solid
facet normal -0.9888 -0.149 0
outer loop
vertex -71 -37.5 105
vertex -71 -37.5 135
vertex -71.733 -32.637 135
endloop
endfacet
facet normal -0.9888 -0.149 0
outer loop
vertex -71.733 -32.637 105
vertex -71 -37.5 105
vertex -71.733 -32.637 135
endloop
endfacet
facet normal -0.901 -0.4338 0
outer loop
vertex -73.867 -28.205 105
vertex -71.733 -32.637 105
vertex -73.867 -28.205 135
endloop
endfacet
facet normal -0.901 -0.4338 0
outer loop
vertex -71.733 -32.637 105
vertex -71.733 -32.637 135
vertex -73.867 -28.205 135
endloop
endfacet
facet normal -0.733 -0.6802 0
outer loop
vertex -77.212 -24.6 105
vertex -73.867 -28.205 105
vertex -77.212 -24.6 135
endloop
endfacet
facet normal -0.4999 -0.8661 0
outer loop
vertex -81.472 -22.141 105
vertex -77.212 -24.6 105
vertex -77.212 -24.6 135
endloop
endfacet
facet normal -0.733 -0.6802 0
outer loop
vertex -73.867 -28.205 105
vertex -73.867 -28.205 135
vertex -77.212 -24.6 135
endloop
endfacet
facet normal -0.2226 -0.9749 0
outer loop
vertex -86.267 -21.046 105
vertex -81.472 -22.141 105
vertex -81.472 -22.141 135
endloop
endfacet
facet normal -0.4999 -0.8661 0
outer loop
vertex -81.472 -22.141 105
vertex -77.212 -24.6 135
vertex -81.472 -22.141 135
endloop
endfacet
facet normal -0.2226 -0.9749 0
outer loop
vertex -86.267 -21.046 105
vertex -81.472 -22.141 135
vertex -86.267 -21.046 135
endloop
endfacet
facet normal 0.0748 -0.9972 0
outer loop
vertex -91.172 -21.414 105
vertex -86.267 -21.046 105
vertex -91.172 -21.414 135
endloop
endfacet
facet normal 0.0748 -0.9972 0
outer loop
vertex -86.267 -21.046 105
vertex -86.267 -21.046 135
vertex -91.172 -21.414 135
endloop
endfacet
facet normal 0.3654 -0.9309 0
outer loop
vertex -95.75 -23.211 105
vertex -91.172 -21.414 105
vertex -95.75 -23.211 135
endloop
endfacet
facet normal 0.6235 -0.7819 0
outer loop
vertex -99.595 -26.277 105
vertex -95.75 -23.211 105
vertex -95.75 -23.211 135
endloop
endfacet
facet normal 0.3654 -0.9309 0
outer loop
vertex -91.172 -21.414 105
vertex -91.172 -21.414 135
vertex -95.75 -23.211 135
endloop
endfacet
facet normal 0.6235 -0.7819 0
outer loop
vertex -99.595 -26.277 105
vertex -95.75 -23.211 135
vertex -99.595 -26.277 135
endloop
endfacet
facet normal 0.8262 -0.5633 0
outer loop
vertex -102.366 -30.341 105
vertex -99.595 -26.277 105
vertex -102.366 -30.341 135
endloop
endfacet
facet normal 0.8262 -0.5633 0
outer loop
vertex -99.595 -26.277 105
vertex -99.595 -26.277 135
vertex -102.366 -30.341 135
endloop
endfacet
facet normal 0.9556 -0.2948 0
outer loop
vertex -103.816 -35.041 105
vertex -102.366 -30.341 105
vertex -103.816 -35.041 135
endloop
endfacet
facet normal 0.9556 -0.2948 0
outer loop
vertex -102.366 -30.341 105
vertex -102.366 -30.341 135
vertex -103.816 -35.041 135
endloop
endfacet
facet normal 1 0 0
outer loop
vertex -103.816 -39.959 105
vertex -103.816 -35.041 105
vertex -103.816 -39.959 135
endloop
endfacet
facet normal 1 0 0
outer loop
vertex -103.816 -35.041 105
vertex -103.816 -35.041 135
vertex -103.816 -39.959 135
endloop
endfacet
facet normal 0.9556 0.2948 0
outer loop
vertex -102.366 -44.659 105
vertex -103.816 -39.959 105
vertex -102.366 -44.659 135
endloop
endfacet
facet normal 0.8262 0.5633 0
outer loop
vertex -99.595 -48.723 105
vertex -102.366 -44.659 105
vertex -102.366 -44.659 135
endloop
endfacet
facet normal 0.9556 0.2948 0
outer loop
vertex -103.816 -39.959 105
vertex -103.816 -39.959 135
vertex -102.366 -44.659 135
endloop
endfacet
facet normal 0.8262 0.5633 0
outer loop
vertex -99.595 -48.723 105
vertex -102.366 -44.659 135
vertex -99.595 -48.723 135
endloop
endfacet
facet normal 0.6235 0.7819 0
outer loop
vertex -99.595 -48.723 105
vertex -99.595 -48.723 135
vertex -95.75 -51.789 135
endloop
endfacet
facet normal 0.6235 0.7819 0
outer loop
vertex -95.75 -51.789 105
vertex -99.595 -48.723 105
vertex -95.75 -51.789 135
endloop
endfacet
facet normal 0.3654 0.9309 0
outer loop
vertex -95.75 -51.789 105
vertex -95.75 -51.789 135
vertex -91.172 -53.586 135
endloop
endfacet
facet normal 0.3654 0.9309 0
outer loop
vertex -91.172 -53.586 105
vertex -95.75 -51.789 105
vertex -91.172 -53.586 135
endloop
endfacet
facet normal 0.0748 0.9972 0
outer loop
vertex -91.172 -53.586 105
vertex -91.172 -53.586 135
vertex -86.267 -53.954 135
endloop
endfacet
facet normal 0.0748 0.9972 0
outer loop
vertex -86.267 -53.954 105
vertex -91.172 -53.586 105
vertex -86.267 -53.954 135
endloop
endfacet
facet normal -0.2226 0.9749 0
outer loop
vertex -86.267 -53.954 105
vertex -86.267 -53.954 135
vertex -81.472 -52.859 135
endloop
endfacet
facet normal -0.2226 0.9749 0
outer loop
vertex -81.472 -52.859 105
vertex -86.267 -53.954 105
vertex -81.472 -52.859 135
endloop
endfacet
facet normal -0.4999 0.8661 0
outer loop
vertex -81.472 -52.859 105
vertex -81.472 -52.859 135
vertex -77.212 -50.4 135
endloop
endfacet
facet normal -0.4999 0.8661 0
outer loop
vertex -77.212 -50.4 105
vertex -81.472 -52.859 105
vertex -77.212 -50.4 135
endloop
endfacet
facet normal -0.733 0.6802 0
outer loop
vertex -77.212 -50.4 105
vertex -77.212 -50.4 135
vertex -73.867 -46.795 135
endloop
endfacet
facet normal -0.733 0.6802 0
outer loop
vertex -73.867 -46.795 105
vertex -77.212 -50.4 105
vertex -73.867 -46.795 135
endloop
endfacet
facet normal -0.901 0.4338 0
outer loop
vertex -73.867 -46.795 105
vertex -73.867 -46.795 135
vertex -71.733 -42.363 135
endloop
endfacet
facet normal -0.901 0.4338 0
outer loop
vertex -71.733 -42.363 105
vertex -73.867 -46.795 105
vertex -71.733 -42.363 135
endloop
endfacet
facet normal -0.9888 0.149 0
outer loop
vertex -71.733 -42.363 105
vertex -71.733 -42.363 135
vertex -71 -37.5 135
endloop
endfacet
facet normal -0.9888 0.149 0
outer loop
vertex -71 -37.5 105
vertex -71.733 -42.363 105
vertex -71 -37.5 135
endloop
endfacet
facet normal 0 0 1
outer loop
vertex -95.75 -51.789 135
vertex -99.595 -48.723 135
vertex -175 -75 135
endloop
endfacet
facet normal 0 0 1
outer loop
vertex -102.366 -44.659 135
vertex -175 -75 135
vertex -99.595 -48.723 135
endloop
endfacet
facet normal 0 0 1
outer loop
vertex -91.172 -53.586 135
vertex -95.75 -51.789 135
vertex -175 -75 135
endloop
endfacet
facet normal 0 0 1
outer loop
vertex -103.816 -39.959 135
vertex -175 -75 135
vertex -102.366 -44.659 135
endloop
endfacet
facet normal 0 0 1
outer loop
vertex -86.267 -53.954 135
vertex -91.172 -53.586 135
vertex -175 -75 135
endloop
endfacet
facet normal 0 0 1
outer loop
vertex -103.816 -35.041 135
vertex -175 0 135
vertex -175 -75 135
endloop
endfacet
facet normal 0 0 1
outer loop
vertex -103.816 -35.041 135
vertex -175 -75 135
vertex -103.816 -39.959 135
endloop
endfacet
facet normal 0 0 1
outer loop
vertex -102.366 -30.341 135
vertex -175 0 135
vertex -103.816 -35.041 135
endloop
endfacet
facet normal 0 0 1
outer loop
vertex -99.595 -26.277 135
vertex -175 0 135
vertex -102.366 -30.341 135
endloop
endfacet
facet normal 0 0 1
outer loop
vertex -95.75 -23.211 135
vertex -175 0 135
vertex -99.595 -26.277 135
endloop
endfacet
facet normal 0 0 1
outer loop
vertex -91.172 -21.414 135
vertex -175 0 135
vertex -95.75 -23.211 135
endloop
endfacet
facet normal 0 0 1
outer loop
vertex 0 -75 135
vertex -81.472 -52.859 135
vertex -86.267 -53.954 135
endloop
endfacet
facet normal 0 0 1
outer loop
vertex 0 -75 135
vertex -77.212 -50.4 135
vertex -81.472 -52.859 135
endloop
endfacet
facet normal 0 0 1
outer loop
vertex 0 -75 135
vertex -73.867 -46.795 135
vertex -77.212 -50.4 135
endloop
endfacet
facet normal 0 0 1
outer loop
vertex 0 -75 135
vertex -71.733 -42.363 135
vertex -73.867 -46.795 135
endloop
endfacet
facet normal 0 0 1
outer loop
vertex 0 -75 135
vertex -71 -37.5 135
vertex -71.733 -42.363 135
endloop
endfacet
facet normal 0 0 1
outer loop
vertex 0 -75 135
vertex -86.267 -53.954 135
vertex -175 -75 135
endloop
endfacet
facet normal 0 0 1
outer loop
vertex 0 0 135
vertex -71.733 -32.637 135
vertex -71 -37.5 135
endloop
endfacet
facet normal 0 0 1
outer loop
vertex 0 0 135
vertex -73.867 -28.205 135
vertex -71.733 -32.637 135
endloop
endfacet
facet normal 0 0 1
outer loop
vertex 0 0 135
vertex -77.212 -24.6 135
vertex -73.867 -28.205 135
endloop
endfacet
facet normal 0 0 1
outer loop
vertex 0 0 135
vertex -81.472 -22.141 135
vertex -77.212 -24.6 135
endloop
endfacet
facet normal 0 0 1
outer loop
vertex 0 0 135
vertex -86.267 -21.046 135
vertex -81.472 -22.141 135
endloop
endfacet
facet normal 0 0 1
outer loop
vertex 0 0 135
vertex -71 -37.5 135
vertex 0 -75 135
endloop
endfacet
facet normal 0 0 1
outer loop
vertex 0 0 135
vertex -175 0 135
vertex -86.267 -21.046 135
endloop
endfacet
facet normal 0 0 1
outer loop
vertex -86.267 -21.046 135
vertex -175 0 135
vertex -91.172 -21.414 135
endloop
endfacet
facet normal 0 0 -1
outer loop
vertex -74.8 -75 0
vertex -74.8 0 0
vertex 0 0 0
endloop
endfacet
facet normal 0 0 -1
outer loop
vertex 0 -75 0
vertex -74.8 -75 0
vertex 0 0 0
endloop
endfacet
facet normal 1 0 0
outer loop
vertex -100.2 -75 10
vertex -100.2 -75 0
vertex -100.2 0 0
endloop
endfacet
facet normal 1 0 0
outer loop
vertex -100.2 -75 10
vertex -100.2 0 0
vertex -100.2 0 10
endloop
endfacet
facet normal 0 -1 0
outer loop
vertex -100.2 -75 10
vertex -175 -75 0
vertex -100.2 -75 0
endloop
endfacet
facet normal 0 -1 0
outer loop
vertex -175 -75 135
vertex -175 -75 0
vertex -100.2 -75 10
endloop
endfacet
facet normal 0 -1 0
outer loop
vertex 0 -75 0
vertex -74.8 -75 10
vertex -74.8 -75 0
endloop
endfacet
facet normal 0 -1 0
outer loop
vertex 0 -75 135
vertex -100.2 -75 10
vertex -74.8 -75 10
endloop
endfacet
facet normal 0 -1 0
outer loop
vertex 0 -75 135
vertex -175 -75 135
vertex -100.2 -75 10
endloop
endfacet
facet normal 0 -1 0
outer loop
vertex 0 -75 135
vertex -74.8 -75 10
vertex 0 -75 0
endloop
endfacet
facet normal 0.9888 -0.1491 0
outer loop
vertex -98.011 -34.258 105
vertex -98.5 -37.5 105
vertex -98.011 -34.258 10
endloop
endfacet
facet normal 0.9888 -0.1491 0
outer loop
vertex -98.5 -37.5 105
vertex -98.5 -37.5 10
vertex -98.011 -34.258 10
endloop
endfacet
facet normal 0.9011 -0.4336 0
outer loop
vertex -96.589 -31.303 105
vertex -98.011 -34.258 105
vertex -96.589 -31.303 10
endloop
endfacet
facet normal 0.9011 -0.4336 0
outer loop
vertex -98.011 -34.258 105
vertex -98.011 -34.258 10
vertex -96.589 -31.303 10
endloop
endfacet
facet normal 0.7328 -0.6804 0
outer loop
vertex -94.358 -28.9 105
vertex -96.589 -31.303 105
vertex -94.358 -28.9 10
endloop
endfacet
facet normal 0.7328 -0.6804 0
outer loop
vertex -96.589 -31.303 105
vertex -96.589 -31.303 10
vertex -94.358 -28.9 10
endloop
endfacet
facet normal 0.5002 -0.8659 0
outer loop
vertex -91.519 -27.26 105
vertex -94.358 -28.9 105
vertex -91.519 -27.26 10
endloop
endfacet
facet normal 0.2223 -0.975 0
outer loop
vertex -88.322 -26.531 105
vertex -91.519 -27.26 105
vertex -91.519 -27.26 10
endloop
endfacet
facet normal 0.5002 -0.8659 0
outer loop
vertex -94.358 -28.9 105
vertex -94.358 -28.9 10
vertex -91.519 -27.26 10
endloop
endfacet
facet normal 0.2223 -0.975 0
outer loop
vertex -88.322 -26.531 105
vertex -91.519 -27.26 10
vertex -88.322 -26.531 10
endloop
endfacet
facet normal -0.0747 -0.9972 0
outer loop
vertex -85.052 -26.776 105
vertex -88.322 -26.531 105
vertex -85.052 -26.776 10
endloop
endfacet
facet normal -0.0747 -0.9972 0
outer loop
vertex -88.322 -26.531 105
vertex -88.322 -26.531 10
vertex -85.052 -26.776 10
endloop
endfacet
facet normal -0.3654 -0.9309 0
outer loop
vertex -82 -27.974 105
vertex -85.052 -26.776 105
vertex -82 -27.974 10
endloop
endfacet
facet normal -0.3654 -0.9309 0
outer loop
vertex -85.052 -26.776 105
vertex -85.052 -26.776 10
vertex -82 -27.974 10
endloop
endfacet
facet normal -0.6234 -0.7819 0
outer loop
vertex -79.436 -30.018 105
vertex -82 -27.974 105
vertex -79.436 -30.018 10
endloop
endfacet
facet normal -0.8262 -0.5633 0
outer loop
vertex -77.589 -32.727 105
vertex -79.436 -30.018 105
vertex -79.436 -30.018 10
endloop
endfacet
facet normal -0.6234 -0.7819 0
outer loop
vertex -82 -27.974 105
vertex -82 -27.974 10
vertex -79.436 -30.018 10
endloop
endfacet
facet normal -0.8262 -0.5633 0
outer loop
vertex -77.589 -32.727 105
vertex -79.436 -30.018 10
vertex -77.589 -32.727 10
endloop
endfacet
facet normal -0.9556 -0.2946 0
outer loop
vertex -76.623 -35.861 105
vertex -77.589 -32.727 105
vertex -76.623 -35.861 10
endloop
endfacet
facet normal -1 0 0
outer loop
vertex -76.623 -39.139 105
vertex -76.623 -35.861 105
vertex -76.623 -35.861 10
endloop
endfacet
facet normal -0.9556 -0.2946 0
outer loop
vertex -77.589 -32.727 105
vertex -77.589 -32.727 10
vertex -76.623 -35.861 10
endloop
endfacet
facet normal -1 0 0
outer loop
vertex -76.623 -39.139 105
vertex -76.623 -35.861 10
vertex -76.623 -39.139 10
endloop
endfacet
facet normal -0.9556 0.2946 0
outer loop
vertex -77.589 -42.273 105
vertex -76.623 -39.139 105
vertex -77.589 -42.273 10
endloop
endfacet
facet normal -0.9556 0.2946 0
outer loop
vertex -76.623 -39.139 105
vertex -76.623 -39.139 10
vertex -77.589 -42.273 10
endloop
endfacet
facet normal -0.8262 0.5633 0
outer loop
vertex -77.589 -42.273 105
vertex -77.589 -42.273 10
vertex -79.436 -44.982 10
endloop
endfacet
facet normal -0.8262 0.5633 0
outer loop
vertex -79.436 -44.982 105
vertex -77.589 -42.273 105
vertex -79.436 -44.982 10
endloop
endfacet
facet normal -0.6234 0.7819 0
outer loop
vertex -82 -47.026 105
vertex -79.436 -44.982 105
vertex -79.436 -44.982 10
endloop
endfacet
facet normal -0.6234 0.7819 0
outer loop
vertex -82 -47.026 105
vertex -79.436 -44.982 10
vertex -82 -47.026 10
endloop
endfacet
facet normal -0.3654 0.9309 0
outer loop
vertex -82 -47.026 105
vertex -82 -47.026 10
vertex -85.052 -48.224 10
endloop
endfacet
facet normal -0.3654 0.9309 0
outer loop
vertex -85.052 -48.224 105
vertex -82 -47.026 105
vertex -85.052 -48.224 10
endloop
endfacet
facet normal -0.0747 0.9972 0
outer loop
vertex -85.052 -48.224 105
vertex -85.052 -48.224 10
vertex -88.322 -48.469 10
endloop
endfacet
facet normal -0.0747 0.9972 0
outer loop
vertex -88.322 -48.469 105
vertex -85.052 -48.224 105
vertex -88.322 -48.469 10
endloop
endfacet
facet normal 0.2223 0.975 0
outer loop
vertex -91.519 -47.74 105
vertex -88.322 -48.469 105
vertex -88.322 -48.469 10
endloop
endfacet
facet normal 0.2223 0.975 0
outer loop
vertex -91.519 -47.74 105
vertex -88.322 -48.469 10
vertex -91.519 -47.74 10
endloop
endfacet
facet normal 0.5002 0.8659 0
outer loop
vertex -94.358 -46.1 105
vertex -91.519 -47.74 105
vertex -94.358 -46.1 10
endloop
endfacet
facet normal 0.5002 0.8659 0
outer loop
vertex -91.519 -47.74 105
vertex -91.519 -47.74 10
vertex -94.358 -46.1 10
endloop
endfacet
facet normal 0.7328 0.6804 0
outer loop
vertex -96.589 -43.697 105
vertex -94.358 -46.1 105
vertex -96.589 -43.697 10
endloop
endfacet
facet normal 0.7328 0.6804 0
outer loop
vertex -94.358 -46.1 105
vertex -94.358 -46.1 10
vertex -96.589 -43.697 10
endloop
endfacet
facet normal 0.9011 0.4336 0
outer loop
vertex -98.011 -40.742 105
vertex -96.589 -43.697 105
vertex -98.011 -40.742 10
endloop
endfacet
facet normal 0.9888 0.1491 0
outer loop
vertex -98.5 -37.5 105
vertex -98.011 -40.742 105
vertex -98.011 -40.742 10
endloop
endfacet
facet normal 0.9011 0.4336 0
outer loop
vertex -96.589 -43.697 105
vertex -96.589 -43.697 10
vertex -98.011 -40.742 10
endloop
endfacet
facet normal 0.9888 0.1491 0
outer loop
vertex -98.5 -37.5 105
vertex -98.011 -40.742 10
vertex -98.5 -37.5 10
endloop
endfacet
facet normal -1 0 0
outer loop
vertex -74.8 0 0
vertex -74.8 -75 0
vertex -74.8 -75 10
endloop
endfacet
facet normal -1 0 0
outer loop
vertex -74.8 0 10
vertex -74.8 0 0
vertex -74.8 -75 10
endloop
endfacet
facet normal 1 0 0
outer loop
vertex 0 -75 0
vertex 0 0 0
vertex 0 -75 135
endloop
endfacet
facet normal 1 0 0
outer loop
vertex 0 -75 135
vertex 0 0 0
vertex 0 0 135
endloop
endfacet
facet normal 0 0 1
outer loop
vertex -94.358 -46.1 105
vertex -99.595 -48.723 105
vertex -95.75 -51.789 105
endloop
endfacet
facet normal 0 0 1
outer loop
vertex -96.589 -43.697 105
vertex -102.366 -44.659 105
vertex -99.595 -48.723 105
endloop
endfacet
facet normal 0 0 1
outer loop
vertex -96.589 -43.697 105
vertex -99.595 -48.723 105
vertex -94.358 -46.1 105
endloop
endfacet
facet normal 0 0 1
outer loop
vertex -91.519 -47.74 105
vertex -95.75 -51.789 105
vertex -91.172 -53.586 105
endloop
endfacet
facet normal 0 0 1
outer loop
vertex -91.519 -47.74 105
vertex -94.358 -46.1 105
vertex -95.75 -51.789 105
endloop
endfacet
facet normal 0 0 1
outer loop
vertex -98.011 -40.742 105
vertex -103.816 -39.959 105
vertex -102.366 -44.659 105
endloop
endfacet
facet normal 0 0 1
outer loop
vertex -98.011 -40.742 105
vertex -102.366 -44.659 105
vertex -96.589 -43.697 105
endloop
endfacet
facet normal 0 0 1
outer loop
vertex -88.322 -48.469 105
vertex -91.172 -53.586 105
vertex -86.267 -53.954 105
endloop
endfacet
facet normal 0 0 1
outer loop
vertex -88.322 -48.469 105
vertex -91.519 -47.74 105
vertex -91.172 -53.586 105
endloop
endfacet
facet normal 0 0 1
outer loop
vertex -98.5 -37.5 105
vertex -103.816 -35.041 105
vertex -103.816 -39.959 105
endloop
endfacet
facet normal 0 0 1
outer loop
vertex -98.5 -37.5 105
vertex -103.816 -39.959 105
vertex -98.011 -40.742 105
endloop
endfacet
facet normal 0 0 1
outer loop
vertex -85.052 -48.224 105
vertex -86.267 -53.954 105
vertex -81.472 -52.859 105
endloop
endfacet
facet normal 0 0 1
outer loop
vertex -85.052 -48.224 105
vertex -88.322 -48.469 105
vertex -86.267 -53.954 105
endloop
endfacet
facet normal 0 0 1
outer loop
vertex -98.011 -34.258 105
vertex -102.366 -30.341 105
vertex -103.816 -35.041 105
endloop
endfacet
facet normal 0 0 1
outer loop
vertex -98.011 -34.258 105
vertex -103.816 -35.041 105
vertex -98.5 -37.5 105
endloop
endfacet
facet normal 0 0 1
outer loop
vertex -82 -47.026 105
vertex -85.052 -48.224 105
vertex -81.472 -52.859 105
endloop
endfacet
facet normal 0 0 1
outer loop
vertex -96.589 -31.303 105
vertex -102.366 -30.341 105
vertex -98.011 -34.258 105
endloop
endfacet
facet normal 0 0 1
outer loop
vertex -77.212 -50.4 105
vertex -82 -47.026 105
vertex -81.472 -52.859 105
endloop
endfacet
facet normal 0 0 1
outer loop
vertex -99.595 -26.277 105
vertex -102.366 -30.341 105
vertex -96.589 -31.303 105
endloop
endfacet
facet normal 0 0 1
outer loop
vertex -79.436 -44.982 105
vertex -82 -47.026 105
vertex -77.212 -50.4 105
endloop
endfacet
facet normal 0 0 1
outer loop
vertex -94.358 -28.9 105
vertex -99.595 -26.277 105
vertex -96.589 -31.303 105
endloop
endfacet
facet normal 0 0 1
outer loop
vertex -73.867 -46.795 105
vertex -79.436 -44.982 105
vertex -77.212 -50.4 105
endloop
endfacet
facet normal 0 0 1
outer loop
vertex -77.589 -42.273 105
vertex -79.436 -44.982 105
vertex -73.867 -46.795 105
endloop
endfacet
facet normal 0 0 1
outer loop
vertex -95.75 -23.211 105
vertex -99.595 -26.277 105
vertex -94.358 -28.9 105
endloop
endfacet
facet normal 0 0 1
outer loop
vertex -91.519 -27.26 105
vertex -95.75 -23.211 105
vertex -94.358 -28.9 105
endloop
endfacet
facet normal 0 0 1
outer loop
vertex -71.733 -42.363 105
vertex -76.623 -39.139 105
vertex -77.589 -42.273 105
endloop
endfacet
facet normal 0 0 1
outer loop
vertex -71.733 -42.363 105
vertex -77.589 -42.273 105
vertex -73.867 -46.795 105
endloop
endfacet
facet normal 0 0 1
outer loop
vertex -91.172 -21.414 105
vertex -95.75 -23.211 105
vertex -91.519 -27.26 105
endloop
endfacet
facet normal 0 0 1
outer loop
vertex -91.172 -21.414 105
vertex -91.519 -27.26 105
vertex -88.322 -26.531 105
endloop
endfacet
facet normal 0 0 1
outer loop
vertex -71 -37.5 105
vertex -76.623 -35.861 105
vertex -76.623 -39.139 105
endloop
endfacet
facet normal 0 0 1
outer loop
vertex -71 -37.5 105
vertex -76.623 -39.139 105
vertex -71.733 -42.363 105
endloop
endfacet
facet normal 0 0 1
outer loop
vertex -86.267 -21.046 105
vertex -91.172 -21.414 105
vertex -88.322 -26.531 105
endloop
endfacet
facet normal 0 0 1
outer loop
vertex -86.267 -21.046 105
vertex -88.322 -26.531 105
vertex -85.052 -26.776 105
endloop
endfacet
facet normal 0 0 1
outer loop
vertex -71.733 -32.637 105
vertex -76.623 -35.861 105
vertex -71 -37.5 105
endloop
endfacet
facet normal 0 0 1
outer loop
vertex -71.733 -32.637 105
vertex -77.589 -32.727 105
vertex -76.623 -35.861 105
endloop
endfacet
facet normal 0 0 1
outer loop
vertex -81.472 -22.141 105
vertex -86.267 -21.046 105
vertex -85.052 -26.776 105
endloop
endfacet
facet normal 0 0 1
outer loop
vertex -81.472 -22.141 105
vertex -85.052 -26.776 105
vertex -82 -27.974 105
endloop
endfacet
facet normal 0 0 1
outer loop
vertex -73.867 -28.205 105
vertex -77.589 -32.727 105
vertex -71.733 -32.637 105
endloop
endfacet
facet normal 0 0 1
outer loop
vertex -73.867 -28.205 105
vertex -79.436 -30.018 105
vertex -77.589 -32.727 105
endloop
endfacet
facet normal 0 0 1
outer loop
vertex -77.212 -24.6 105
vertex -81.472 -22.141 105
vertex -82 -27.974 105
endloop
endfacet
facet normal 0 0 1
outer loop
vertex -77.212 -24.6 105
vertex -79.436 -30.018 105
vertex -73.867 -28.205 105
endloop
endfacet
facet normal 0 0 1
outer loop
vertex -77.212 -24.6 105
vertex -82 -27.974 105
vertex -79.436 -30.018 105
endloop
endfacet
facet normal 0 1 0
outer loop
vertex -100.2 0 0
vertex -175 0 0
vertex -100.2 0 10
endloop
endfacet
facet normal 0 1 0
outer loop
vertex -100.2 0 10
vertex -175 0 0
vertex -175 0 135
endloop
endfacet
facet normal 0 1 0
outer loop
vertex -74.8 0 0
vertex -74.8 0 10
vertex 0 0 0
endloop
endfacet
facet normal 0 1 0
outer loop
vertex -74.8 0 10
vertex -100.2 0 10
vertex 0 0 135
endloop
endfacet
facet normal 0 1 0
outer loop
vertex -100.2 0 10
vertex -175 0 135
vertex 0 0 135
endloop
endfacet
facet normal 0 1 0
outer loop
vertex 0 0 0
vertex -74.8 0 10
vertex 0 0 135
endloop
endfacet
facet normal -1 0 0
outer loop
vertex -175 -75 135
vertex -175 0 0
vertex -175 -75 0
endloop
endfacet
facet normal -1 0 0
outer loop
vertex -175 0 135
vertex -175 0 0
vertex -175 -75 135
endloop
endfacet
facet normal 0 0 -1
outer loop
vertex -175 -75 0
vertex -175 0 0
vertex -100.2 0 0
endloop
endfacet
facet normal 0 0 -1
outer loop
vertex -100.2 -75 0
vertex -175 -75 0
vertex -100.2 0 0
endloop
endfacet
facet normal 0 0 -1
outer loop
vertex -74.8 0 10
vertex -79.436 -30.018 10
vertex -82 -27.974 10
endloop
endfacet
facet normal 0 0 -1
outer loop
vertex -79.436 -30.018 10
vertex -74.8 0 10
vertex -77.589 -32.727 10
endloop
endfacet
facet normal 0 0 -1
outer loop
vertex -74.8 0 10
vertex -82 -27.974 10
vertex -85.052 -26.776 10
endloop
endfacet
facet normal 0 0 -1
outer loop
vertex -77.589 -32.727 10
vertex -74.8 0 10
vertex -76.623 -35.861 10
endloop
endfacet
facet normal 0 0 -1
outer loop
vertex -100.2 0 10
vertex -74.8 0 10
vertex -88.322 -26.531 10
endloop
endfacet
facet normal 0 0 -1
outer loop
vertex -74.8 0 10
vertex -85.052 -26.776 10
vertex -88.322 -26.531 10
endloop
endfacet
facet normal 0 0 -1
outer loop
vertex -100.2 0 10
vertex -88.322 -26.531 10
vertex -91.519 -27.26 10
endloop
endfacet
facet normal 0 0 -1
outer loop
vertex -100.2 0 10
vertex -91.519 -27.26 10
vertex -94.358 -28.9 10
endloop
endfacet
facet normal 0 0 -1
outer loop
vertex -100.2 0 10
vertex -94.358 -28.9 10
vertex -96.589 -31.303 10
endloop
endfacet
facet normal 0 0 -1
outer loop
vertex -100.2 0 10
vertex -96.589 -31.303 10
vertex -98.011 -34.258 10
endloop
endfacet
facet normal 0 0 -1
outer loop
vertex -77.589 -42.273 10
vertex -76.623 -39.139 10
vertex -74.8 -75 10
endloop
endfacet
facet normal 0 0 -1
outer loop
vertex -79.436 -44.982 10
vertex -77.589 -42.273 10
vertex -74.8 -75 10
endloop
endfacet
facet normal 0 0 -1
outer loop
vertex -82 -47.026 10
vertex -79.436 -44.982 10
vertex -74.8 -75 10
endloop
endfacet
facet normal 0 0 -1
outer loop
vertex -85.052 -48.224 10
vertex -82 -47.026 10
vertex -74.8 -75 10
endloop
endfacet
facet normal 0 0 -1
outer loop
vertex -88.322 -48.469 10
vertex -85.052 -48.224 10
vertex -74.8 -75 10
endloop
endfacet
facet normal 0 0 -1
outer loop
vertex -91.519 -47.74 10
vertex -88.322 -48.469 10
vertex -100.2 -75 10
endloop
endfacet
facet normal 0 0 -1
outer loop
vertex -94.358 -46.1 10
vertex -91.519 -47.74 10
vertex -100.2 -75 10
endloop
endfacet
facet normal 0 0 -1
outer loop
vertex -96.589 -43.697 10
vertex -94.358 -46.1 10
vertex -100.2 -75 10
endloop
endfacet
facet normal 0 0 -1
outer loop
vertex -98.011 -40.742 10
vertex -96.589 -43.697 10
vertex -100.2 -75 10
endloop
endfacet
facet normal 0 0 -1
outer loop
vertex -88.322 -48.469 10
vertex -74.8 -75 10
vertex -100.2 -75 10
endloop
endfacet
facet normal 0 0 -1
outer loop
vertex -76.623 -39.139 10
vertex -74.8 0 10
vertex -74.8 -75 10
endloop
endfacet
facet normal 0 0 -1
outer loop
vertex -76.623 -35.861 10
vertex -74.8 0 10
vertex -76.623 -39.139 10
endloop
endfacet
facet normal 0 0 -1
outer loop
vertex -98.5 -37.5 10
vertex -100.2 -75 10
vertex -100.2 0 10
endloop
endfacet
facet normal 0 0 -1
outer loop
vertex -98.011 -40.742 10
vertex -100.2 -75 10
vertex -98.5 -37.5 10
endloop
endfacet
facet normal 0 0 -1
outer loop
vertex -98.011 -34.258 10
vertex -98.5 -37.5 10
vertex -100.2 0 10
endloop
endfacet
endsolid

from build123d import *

# Parameters (mm, degrees)
F0_W           = 175
F0_H           = 135
F1_DEPTH       = 75
F2_W           = 12.7
F2_H           = 20
F3_DEPTH       = 92.1
F5_D           = 22
F5_DEPTH       = 180
F5_CBORE_D     = 33
F5_CBORE_DEPTH = 30


with BuildPart() as f1:
    # F0 (on Front) → F1 (new body)
    with BuildSketch(Plane.XZ):
        with Locations((-87.5, 67.5)):
            Rectangle(F0_W, F0_H)
    extrude(amount=F1_DEPTH)

    # F2 (on face) → F3 (cut)
    with BuildSketch(Plane.XZ.offset(75)):
        with Locations((-93.85, 0)):
            Rectangle(F2_W, F2_H)
        with Locations((-81.15, 0)):
            Rectangle(F2_W, F2_H)
    extrude(amount=-F3_DEPTH, mode=Mode.SUBTRACT)

    # F5
    with Locations(Plane.XY.offset(135)):
        with Locations((-87.5, -37.5)):
            CounterBoreHole(F5_D / 2, F5_CBORE_D / 2, F5_CBORE_DEPTH, depth=F5_DEPTH)


solid = f1.part
